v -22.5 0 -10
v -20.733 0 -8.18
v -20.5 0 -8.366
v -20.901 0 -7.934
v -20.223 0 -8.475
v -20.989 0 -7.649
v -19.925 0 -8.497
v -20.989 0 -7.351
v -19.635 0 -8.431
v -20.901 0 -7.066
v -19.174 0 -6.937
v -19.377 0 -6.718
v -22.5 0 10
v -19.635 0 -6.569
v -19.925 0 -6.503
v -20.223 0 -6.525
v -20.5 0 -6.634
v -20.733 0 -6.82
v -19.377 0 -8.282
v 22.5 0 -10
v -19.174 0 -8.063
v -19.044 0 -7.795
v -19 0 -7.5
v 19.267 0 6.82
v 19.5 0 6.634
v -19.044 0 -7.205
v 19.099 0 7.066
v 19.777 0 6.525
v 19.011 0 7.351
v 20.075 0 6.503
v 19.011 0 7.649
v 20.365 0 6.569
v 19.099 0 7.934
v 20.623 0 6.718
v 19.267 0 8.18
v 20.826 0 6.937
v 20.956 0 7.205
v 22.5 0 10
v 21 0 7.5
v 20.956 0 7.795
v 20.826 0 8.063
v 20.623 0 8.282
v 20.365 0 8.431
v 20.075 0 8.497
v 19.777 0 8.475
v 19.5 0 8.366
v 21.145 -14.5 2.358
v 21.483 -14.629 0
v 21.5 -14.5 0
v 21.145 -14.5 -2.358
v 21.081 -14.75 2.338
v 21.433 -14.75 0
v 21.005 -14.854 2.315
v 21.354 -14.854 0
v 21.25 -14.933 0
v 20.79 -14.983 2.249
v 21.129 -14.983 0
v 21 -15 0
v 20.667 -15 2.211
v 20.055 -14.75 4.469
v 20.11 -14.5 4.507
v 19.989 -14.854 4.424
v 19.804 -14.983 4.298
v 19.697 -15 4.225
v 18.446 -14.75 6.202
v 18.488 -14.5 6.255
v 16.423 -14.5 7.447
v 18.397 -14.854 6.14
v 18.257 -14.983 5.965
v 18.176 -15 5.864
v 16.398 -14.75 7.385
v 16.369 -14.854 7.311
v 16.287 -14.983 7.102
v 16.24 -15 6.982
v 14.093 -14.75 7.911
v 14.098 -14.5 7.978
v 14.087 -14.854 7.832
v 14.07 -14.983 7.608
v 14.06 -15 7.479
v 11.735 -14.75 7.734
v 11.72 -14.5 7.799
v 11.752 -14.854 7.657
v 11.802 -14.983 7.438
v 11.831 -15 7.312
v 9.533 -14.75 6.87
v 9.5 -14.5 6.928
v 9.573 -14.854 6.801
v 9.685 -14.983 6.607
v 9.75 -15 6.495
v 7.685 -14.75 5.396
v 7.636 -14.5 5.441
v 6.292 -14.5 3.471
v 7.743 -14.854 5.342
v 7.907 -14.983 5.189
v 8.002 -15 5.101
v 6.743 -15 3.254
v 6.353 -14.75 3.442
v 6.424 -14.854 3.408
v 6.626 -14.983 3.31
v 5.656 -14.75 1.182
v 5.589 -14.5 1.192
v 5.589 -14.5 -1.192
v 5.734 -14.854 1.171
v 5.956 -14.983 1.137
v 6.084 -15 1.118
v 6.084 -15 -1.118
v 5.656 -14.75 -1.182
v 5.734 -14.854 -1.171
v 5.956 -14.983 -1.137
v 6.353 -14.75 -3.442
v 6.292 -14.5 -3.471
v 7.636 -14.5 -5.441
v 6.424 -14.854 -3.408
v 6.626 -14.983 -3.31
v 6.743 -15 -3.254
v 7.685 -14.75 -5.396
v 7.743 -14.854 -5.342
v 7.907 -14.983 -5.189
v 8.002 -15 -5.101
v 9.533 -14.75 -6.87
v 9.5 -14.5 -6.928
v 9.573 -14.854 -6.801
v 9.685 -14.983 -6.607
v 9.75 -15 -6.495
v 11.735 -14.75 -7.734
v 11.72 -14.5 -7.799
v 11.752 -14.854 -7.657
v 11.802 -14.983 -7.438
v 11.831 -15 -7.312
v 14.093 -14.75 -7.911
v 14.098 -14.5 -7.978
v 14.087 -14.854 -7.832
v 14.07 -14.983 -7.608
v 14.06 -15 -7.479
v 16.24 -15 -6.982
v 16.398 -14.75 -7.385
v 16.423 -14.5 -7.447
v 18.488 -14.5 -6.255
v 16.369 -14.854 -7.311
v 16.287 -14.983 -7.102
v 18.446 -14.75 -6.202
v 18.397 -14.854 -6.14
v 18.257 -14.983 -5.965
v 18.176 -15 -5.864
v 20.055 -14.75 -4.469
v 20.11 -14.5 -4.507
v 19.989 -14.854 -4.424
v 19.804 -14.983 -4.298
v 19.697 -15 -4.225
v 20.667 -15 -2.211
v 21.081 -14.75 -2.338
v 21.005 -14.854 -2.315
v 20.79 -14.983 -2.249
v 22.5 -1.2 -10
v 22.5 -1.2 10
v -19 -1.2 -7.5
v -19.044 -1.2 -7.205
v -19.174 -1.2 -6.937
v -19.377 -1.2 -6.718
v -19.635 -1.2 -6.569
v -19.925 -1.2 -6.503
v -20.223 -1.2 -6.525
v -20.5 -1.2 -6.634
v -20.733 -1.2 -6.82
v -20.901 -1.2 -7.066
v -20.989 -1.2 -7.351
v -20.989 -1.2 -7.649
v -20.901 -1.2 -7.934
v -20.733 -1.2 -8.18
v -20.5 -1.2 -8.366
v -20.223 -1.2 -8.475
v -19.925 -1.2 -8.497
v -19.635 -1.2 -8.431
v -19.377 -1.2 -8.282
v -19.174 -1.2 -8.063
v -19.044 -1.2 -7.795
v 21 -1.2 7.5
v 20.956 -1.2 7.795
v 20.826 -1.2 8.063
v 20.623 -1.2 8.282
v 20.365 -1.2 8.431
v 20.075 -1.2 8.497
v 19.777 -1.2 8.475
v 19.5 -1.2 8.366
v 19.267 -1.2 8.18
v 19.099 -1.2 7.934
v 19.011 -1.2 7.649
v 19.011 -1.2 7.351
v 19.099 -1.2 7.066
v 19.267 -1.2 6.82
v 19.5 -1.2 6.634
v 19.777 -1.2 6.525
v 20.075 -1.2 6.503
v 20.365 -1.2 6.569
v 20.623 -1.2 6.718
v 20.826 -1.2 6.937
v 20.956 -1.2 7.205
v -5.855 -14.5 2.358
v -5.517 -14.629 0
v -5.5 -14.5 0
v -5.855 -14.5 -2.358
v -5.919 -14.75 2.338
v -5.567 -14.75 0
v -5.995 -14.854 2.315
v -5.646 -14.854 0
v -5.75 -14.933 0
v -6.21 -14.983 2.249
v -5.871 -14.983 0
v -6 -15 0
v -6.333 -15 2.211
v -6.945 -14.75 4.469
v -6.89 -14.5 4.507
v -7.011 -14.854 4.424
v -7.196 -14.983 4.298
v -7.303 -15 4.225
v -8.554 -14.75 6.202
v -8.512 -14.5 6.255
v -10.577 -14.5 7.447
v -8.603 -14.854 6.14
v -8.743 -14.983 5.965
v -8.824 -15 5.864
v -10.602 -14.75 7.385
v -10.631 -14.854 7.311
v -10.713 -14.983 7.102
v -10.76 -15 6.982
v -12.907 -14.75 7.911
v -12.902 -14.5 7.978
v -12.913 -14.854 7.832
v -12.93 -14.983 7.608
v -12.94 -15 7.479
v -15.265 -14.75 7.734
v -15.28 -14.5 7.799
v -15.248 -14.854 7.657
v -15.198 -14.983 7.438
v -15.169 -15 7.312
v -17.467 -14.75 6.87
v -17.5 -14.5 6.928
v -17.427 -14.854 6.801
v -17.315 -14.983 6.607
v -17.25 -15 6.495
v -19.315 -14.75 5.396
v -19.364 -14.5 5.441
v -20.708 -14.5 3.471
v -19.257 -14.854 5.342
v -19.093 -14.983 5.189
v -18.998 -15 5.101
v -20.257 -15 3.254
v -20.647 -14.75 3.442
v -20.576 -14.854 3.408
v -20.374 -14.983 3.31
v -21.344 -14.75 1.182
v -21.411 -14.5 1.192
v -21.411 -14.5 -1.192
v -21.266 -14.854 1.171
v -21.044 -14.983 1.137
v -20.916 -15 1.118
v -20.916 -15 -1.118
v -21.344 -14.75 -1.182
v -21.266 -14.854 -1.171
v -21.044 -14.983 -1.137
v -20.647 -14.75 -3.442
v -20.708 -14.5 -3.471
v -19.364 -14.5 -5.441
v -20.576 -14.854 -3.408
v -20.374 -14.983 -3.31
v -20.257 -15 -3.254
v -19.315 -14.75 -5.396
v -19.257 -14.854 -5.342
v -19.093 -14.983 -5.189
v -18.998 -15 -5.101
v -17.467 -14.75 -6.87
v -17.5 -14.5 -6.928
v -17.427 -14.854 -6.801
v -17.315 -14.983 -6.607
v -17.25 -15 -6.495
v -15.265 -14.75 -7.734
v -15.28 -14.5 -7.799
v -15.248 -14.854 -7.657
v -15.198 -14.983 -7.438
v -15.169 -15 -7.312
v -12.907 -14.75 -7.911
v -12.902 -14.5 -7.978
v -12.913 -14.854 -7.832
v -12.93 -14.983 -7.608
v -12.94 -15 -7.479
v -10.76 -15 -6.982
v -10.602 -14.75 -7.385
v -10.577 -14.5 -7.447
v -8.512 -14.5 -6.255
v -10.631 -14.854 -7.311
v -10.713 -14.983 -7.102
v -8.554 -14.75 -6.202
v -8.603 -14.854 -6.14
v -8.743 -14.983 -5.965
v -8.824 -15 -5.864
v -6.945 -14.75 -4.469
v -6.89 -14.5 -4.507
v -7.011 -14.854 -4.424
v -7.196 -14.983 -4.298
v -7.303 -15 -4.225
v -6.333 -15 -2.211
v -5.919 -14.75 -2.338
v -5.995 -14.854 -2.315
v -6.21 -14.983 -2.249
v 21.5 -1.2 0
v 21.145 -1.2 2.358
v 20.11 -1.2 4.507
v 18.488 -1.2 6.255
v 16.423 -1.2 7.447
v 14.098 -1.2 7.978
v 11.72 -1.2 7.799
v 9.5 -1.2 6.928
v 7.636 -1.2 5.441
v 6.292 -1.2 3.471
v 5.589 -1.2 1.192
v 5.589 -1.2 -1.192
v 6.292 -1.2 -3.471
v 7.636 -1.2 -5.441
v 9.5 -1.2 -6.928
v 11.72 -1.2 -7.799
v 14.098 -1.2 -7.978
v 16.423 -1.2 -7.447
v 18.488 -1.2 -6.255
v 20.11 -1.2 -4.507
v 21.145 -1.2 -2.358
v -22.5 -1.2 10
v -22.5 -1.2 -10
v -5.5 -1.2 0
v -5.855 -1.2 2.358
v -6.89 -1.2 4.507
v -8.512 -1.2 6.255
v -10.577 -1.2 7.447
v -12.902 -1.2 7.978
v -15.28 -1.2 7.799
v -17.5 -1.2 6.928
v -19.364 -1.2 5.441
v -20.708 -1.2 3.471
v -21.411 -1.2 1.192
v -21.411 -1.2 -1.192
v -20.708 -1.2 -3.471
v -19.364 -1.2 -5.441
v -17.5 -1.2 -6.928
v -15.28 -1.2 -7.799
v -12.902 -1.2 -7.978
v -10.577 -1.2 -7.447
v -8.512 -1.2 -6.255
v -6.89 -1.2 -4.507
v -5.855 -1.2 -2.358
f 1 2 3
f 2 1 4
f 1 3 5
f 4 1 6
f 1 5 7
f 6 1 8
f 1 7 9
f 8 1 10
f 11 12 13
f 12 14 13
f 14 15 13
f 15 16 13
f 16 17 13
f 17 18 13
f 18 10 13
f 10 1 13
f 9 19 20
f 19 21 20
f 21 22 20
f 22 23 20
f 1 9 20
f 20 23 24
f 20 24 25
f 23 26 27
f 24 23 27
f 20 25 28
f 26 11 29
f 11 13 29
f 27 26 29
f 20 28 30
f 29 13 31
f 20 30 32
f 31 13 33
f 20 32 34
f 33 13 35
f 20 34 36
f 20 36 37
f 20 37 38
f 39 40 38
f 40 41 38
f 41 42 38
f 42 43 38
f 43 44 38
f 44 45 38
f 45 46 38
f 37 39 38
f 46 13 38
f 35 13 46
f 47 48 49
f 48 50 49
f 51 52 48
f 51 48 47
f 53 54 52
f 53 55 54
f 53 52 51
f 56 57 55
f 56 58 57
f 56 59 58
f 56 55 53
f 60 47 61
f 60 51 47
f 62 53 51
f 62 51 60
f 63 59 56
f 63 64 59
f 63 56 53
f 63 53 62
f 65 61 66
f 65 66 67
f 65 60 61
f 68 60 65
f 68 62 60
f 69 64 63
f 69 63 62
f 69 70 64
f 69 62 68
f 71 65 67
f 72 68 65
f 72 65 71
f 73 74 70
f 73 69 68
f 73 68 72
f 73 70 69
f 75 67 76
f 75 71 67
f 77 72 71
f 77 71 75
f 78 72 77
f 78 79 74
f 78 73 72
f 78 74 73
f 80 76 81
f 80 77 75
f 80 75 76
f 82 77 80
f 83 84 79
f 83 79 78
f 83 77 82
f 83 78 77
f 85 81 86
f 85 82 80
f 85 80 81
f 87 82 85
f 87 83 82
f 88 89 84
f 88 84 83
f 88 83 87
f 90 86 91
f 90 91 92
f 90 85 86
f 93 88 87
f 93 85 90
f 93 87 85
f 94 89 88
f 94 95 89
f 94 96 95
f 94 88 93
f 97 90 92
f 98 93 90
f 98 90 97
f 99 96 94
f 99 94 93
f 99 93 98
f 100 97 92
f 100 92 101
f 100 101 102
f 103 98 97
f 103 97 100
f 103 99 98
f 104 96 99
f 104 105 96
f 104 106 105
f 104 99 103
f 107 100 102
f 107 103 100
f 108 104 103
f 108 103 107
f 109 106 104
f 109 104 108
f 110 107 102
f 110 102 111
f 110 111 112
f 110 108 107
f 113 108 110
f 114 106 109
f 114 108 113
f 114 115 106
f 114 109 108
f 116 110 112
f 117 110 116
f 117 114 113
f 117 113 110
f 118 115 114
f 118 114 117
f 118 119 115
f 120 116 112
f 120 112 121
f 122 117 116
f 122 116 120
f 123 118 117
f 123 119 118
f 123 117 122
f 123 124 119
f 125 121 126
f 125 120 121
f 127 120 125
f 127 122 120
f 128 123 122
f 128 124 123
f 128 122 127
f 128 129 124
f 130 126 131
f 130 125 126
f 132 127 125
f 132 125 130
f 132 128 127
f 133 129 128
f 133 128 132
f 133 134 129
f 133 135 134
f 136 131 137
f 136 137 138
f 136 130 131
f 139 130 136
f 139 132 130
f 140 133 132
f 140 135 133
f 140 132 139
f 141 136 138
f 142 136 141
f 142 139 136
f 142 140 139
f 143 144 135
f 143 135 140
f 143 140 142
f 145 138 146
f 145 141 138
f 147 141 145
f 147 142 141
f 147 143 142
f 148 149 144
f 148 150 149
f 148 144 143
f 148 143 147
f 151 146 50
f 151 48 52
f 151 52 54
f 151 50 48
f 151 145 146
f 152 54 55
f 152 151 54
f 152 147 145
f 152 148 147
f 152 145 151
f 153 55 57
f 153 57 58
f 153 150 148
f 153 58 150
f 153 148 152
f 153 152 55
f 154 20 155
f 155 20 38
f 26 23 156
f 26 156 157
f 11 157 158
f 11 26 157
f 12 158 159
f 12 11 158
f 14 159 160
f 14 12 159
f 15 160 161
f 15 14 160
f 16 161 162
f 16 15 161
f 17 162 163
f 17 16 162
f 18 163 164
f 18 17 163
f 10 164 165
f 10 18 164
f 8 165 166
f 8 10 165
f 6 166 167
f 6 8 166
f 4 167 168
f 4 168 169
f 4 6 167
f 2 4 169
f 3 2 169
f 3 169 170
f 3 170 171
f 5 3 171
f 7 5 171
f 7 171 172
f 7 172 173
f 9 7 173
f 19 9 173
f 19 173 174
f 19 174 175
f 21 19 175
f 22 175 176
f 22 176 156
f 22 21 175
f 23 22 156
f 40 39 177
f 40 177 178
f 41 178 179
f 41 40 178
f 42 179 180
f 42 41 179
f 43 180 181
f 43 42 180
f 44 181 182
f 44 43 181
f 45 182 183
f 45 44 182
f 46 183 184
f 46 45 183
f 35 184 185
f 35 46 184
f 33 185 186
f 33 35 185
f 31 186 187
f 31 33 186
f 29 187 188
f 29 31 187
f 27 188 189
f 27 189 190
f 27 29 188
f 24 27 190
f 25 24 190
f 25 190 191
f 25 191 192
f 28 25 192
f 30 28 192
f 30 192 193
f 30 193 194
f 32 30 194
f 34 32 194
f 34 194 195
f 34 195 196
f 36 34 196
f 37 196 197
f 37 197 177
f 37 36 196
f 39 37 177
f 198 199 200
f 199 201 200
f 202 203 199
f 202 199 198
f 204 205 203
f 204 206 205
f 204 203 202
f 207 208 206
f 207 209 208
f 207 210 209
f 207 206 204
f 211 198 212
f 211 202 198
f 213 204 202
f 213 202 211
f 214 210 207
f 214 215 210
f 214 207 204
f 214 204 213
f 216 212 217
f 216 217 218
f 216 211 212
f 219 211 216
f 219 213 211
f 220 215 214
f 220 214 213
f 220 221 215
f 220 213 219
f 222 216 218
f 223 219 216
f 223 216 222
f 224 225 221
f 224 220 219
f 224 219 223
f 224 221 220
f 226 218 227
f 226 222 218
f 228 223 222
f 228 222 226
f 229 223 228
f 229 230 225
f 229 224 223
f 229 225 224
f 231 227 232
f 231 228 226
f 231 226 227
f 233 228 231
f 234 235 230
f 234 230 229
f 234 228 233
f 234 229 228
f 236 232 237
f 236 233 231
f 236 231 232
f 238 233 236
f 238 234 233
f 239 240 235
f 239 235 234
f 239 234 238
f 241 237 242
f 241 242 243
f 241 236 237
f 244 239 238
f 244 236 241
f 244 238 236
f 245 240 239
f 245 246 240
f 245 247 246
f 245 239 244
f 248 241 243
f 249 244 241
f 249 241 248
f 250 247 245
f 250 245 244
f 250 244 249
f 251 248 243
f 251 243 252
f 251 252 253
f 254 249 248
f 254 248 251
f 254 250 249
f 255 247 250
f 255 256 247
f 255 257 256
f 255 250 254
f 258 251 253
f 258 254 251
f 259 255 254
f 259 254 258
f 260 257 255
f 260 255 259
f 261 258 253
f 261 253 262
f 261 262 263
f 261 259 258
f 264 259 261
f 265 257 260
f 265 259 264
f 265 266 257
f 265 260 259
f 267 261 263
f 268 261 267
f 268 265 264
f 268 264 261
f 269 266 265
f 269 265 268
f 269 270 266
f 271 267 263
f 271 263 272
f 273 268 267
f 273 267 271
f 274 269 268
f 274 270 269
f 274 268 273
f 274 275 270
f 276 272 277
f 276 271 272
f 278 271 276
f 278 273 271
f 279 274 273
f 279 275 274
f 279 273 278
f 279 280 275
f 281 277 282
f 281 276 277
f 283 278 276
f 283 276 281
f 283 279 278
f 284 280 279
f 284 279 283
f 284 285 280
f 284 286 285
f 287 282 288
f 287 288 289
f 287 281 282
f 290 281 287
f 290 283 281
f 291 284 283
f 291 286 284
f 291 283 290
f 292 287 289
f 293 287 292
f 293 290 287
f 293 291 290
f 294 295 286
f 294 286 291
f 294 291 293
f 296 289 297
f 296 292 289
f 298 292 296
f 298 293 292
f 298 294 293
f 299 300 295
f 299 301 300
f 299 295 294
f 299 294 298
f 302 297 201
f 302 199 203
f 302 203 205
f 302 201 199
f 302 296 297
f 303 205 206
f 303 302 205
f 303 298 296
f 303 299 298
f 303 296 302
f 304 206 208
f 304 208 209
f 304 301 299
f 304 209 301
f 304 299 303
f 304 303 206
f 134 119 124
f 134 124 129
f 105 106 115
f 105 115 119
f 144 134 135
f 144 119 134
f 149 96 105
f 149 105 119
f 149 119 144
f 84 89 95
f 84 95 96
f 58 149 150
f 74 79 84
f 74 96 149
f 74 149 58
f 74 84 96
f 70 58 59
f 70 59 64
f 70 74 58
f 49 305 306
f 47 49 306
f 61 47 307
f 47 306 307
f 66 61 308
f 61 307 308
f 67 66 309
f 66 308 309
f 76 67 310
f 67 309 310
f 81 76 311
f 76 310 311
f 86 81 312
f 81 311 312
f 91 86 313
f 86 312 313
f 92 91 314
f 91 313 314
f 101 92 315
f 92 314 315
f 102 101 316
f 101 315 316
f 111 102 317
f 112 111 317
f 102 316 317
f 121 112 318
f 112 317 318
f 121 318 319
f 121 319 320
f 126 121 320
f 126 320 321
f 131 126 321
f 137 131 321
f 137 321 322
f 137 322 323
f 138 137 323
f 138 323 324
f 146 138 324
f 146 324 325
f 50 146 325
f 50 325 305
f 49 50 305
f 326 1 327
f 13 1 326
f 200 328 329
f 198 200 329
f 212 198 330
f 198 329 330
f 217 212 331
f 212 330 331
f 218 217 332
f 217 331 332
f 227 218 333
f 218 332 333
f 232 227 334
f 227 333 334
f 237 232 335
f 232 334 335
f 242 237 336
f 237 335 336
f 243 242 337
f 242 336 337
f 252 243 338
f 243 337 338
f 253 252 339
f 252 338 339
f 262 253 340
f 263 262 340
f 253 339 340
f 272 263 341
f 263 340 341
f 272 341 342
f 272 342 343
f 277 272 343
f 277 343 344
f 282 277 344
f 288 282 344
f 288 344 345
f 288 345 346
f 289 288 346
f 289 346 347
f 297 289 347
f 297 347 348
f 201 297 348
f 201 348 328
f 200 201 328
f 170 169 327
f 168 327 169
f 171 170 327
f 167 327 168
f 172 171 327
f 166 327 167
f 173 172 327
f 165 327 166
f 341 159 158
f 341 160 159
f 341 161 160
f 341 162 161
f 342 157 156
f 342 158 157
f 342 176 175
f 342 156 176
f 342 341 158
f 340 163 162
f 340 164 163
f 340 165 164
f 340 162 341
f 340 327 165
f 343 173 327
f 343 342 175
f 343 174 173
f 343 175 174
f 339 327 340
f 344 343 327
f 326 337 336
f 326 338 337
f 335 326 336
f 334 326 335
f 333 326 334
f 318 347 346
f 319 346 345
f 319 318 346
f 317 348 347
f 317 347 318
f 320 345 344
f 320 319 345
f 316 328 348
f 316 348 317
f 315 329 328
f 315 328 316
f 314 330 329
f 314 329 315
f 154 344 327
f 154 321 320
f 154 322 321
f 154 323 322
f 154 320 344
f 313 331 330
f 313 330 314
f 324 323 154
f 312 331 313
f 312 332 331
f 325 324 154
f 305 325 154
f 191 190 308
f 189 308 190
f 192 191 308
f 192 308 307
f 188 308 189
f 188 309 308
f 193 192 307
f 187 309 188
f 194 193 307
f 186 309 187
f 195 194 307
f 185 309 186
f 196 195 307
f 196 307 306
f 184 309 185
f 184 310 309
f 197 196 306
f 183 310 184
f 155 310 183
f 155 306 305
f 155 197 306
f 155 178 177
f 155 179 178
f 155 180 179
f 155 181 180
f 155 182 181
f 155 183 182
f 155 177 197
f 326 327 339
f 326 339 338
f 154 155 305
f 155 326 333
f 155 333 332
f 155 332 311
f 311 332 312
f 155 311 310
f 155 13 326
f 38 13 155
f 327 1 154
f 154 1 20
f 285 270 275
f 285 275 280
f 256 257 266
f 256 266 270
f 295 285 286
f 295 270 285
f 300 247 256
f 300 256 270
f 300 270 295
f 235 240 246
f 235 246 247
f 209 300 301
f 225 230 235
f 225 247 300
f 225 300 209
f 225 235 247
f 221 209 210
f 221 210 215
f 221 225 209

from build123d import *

# Parameters (mm, degrees)
F0_R     = 8
F1_DEPTH = 15
F0_W     = 45
F0_H     = 20
F0_R_2   = 1
F2_DEPTH = 1.2
F3_R     = 0.5


with BuildPart() as f1:
    # F0 (on Front) → F1 (new body)
    with BuildSketch(Plane.XZ):
        with Locations((-13.5, 0)):
            Circle(F0_R)
    extrude(amount=F1_DEPTH)



with BuildPart() as f1b:
    # F0 (on Front) → F1, piece 2 (new body)
    with BuildSketch(Plane.XZ):
        with Locations((13.5, 0)):
            Circle(F0_R)
    extrude(amount=F1_DEPTH)


with BuildPart() as f1_1:
    add(f1.part)

    add(f1b.part)  # F2 merges F1b
    # F0 (on Front) → F2 (join)
    with BuildSketch(Plane.XZ):
        Rectangle(F0_W, F0_H)
        with Locations((-20, -7.5)):
            Circle(F0_R_2, mode=Mode.SUBTRACT)
        with Locations((-13.5, 0)):
            Circle(F0_R, mode=Mode.SUBTRACT)
        with Locations((13.5, 0)):
            Circle(F0_R, mode=Mode.SUBTRACT)
        with Locations((20, 7.5)):
            Circle(F0_R_2, mode=Mode.SUBTRACT)
    extrude(amount=F2_DEPTH)

    # F3
    f3_edges = [f1_1.edges().sort_by_distance(p)[0] for p in [
        (-21.5, -15, 0),
        (5.5, -15, 0),
    ]]
    fillet(f3_edges, radius=F3_R)


solid = f1_1.part
